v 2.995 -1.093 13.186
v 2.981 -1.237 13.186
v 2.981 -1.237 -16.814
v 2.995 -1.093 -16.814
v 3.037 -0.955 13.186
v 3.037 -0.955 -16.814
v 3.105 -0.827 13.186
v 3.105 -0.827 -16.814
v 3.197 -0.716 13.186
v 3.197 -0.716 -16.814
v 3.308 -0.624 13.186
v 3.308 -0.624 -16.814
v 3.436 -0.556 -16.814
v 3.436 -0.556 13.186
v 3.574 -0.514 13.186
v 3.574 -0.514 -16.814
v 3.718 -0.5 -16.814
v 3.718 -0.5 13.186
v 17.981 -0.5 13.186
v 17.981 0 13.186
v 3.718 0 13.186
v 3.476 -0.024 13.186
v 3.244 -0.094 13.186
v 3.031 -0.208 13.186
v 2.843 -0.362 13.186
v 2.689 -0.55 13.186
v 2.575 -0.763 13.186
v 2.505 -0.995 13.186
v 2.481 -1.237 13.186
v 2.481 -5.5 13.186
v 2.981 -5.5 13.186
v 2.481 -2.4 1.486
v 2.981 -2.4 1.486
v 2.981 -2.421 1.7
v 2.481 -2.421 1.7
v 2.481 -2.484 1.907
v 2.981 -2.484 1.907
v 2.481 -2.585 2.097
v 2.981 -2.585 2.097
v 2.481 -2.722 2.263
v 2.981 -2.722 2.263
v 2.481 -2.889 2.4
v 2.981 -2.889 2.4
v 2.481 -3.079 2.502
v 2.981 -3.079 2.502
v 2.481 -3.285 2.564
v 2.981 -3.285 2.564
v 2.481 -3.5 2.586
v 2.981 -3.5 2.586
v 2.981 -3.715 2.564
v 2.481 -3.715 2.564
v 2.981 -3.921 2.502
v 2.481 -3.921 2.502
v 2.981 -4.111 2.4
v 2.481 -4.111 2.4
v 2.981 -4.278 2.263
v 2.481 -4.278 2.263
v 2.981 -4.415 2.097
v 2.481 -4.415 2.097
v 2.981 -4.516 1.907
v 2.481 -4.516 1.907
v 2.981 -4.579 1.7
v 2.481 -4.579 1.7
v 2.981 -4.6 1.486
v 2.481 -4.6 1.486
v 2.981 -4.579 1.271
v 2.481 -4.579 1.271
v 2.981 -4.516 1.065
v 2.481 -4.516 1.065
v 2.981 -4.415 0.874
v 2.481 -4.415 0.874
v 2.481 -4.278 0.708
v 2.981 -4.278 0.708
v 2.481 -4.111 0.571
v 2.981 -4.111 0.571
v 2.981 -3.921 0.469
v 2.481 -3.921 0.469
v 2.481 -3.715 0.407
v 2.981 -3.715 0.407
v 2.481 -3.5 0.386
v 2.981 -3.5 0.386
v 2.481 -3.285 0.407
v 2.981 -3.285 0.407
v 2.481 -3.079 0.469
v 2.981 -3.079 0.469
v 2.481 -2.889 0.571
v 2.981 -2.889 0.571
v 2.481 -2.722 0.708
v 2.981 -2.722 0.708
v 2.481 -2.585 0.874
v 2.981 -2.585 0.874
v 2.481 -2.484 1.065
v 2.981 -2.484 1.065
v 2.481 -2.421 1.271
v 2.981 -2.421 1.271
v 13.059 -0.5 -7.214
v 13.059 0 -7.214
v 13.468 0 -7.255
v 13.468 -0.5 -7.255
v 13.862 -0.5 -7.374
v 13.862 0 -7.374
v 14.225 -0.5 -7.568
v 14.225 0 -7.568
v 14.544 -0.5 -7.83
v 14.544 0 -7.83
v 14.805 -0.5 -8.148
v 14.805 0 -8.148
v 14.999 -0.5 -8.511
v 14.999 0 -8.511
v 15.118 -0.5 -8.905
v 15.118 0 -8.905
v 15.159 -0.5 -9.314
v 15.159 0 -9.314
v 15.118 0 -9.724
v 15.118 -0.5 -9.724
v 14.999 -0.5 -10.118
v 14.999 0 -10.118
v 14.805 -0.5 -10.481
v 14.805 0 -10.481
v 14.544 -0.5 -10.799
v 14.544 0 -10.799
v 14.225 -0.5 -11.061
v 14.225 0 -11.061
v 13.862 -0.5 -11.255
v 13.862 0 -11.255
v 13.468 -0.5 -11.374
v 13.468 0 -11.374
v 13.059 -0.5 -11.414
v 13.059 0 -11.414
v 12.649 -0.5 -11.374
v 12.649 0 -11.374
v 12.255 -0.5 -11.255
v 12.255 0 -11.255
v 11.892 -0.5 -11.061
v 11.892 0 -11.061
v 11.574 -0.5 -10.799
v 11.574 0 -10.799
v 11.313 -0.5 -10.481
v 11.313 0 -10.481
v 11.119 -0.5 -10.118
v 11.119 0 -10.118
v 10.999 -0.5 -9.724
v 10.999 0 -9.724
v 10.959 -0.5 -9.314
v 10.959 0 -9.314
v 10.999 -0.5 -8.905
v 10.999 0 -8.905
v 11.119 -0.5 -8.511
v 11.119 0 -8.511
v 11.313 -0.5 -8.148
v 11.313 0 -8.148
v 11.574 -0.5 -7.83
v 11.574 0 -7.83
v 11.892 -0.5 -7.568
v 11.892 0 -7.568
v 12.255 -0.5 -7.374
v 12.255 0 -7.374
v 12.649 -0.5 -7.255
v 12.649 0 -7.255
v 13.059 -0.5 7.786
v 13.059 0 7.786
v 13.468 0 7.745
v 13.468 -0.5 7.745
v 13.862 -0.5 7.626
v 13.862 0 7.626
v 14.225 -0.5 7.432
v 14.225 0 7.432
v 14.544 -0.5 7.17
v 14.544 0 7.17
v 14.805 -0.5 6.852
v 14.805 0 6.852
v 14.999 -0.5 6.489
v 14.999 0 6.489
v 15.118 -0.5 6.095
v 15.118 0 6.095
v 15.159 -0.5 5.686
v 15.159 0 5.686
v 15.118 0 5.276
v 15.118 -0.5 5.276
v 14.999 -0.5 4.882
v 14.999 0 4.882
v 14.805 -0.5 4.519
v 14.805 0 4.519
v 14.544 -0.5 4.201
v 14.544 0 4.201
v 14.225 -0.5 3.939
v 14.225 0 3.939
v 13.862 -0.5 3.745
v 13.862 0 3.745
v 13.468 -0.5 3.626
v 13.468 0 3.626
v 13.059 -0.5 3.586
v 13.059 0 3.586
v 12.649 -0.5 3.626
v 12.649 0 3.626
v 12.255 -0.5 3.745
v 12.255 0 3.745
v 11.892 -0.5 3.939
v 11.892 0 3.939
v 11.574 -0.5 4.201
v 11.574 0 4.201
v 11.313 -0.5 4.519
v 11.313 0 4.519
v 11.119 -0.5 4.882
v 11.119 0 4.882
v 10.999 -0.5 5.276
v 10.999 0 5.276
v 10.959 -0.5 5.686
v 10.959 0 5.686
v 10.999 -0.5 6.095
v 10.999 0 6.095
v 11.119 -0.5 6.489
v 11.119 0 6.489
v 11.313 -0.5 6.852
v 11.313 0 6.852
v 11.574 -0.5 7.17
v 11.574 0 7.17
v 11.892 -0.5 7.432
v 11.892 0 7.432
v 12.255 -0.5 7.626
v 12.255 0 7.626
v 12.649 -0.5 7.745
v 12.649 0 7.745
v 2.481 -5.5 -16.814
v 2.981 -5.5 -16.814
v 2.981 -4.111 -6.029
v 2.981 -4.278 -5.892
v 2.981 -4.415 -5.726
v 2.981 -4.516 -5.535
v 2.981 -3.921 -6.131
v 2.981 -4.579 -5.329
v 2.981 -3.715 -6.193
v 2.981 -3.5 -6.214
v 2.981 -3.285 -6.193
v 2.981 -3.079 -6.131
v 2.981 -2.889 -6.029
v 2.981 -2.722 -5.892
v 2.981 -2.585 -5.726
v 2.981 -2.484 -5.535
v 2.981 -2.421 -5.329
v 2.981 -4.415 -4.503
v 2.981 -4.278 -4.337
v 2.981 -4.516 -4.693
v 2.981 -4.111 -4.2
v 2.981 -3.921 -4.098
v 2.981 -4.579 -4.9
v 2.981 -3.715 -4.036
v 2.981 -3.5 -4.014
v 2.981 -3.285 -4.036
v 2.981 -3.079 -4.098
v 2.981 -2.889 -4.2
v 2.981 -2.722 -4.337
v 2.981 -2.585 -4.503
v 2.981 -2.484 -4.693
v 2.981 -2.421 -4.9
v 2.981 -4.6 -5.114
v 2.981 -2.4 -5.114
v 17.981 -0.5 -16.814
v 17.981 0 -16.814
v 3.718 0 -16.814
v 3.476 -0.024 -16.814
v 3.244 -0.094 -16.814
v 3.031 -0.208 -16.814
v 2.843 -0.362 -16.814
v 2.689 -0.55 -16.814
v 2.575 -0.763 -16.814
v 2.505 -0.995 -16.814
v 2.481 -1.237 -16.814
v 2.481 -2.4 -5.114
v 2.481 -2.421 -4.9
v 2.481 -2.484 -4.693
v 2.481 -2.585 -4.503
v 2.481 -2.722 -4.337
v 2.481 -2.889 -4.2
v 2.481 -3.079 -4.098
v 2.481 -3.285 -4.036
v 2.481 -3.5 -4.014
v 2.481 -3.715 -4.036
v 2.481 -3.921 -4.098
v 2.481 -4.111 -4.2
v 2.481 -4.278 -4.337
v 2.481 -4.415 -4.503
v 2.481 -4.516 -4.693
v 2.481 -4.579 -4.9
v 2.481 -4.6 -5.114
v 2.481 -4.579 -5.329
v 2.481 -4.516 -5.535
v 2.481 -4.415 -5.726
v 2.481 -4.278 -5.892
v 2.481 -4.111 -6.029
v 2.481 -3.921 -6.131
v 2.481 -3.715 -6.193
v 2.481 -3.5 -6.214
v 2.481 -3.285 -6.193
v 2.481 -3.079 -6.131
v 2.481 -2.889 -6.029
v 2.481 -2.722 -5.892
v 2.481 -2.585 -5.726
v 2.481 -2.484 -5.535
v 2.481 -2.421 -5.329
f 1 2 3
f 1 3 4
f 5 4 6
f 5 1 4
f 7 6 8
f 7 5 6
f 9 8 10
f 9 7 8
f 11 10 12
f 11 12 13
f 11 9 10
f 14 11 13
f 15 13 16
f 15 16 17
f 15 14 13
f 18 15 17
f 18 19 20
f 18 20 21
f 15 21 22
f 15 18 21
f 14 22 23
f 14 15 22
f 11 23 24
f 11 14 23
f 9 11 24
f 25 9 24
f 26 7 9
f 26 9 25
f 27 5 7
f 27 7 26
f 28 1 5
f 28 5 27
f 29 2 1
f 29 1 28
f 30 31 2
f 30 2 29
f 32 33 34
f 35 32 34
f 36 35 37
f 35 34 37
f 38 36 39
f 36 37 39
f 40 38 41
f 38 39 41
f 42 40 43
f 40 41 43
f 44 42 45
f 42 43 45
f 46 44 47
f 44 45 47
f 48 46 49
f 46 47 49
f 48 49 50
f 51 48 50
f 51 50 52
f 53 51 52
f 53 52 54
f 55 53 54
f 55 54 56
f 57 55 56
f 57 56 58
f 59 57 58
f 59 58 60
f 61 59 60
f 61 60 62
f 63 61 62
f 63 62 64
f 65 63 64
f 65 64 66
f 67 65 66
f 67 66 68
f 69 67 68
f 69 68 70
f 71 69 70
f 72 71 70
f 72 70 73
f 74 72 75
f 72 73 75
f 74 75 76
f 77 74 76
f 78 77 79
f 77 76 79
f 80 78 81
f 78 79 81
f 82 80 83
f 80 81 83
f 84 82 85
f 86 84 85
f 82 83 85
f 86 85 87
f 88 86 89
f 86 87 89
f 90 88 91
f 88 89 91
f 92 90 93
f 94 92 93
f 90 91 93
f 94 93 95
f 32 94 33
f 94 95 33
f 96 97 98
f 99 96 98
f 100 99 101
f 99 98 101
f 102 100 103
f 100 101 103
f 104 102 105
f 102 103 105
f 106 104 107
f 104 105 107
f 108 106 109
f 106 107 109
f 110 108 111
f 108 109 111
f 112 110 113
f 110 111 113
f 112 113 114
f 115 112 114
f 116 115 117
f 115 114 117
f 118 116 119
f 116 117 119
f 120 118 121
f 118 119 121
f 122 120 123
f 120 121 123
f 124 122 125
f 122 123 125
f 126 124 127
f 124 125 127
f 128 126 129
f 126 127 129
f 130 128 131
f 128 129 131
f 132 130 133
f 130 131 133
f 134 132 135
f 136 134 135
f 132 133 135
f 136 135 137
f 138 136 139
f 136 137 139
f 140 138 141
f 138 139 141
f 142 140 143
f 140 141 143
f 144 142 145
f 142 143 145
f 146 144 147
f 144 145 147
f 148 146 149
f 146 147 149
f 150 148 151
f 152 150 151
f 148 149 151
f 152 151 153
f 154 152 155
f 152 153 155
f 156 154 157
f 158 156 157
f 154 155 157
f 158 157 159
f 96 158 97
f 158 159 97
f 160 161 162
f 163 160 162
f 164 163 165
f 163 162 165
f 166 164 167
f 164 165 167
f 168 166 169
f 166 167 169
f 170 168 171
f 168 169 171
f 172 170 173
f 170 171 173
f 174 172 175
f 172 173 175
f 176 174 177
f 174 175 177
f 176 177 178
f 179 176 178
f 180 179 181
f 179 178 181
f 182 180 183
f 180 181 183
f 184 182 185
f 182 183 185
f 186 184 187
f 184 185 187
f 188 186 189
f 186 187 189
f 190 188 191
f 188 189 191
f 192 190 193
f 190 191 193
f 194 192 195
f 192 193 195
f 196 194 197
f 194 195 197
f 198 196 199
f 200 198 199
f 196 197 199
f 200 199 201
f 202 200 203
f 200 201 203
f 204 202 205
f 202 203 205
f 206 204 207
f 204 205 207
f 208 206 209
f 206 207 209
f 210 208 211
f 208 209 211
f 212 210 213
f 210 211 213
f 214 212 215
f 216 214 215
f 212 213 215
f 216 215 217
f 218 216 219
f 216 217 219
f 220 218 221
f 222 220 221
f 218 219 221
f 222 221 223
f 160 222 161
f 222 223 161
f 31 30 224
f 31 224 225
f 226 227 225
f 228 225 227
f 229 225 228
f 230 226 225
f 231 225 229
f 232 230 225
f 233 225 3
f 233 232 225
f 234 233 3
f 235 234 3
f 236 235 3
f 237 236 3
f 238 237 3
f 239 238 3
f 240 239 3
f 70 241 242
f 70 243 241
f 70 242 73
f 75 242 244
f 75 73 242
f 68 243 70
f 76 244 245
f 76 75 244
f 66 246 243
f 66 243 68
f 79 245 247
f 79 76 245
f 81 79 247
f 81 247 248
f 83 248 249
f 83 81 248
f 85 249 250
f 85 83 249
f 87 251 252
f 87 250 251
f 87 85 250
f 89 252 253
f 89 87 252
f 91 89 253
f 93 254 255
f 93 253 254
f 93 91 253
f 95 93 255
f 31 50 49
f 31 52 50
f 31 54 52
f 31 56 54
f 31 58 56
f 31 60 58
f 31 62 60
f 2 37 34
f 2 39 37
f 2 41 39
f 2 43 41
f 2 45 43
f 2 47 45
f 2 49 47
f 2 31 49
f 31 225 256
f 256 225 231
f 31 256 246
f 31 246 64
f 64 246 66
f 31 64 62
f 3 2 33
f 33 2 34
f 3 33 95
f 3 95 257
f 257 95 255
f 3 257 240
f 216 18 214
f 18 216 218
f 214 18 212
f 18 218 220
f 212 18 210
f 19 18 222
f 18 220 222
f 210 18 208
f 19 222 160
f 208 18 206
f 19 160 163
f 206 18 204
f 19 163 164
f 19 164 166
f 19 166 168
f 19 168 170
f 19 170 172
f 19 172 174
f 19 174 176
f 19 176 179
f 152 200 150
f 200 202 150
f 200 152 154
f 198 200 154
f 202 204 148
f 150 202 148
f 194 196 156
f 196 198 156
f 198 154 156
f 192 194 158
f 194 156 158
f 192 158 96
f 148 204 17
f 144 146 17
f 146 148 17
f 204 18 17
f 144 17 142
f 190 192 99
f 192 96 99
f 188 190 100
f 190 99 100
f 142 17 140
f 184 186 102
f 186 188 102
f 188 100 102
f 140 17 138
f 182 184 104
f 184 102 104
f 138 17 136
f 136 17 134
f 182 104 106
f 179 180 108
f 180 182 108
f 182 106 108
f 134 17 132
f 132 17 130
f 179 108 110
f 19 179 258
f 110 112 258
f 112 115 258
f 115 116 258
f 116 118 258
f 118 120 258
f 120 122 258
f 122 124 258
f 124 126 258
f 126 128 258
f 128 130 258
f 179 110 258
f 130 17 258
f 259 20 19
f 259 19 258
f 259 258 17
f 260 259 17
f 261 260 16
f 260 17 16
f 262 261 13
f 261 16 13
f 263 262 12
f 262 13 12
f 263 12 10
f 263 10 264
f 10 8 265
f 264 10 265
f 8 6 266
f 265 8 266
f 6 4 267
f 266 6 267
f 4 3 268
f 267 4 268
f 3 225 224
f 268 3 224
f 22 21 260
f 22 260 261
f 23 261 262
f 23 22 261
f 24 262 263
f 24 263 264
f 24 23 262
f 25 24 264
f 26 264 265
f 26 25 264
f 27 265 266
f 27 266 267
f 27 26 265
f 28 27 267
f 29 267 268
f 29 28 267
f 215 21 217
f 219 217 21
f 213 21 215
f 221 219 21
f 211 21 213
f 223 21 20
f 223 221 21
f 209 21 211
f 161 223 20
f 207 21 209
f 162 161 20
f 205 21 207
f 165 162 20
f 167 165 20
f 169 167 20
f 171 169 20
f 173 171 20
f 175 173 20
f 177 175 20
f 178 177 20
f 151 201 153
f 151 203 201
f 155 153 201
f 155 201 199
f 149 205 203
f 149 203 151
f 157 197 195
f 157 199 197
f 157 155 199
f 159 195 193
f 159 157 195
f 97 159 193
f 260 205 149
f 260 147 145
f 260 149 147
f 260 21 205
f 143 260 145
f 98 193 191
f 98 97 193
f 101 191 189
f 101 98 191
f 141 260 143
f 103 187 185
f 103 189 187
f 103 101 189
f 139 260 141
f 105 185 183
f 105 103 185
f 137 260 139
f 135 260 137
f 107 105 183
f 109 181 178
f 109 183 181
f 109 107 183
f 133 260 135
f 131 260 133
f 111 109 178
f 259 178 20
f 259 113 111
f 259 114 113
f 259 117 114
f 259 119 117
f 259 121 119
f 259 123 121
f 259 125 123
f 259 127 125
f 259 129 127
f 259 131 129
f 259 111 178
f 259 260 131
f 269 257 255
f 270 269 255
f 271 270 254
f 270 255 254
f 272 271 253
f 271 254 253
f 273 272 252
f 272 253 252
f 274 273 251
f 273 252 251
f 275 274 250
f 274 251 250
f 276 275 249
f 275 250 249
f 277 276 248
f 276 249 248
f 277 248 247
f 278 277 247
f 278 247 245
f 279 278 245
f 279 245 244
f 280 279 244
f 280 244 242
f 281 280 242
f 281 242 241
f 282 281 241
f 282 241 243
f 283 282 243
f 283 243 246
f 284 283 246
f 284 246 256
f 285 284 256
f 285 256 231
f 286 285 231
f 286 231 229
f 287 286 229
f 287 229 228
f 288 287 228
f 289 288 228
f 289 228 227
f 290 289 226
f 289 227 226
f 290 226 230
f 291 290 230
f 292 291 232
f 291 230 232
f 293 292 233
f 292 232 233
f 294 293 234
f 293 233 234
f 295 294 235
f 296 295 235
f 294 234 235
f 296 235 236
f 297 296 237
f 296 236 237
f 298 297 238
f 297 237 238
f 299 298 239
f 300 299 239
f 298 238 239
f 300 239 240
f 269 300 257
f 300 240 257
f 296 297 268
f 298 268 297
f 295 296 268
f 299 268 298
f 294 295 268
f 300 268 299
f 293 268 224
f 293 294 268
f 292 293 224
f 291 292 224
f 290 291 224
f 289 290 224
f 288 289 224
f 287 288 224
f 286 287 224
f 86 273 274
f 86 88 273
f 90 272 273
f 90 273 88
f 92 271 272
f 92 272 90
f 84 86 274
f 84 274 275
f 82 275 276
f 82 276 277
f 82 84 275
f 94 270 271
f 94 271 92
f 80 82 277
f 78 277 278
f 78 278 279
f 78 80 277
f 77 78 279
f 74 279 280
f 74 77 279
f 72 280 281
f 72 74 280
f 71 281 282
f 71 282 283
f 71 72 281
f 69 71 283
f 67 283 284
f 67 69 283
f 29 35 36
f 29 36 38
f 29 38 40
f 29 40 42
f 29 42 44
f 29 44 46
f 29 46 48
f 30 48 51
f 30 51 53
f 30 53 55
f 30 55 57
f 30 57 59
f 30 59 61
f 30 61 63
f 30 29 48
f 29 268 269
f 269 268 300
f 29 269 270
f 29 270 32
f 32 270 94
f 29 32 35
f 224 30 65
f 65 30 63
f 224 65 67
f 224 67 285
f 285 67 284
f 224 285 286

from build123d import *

# Parameters (mm, degrees)
SKETCH1_W                    = 15
SKETCH1_H                    = 30
SKETCH1_R                    = 2.1
BASE_FLANGE1_DEPTH           = 0.5
EDGE_FLANGE1_STRIP_W         = 3.4732
EDGE_FLANGE1_STRIP_H         = 0.5
EDGE_FLANGE1_STRIP_CUT_DEPTH = 30
EDGE_FLANGE1_DEPTH           = 30
SKETCH8_R                    = 1.1
CUT_EXTRUDE1_DEPTH           = 10


# Sheet-metal steps are written as plain solids
with BuildPart() as part:
    # Sketch1 → Base-Flange1 (new body)
    with BuildSketch(Plane(origin=(0, 0, 0), x_dir=(1, 0, 0), z_dir=(0, 1, 0))):
        with Locations((10.481024164, 1.814426404)):
            Rectangle(SKETCH1_W, SKETCH1_H)
        with Locations(Location((13.058795971, -5.685573596, 0), (0, 0, 270))):
            Circle(SKETCH1_R, mode=Mode.SUBTRACT)
        with Locations(Location((13.058795971, 9.314426404, 0), (0, 0, 270))):
            Circle(SKETCH1_R, mode=Mode.SUBTRACT)
    extrude(amount=-BASE_FLANGE1_DEPTH)

    # Edge-Flange1 strip (across the edge) → Edge-Flange1 strip cut (cut)
    with BuildSketch(Plane(origin=(2.981024164, -0.5, 13.185573596), x_dir=(1, 0, 0), z_dir=(0, 0, -1))):
        with Locations((-1, -0.25)):
            Rectangle(EDGE_FLANGE1_STRIP_W, EDGE_FLANGE1_STRIP_H)
    extrude(amount=EDGE_FLANGE1_STRIP_CUT_DEPTH, mode=Mode.SUBTRACT)

    # Edge-Flange1 section (across the edge) → Edge-Flange1 (add)
    with BuildSketch(Plane(origin=(2.981024164, -0.5, 13.185573596), x_dir=(1, 0, 0), z_dir=(0, 0, -1))):
        with BuildLine():
            Line((-0.5, 0.7366), (-0.5, 5))
            Line((-0.5, 5), (0, 5))
            Line((0, 5), (0, 0.7366))
            ThreePointArc((0, 0.7366), (0.215745145, 0.215745145), (0.7366, 0))
            Line((0.7366, 0), (0.7366, -0.5))
            ThreePointArc((0.7366, -0.5), (-0.137808246, -0.137808246), (-0.5, 0.7366))
        make_face()
    extrude(amount=EDGE_FLANGE1_DEPTH)

    # Sketch8 → Cut-Extrude1 (cut)
    with BuildSketch(Plane(origin=(2.981024164, 0, 0), x_dir=(0, 0, -1), z_dir=(1, 0, 0))):
        with Locations(Location((5.114426404, -3.5, 0), (0, 0, 90))):
            Circle(SKETCH8_R)
        with Locations(Location((-1.485573596, -3.5, 0), (0, 0, 90))):
            Circle(SKETCH8_R)
    extrude(amount=-CUT_EXTRUDE1_DEPTH, mode=Mode.SUBTRACT)


solid = part.part
